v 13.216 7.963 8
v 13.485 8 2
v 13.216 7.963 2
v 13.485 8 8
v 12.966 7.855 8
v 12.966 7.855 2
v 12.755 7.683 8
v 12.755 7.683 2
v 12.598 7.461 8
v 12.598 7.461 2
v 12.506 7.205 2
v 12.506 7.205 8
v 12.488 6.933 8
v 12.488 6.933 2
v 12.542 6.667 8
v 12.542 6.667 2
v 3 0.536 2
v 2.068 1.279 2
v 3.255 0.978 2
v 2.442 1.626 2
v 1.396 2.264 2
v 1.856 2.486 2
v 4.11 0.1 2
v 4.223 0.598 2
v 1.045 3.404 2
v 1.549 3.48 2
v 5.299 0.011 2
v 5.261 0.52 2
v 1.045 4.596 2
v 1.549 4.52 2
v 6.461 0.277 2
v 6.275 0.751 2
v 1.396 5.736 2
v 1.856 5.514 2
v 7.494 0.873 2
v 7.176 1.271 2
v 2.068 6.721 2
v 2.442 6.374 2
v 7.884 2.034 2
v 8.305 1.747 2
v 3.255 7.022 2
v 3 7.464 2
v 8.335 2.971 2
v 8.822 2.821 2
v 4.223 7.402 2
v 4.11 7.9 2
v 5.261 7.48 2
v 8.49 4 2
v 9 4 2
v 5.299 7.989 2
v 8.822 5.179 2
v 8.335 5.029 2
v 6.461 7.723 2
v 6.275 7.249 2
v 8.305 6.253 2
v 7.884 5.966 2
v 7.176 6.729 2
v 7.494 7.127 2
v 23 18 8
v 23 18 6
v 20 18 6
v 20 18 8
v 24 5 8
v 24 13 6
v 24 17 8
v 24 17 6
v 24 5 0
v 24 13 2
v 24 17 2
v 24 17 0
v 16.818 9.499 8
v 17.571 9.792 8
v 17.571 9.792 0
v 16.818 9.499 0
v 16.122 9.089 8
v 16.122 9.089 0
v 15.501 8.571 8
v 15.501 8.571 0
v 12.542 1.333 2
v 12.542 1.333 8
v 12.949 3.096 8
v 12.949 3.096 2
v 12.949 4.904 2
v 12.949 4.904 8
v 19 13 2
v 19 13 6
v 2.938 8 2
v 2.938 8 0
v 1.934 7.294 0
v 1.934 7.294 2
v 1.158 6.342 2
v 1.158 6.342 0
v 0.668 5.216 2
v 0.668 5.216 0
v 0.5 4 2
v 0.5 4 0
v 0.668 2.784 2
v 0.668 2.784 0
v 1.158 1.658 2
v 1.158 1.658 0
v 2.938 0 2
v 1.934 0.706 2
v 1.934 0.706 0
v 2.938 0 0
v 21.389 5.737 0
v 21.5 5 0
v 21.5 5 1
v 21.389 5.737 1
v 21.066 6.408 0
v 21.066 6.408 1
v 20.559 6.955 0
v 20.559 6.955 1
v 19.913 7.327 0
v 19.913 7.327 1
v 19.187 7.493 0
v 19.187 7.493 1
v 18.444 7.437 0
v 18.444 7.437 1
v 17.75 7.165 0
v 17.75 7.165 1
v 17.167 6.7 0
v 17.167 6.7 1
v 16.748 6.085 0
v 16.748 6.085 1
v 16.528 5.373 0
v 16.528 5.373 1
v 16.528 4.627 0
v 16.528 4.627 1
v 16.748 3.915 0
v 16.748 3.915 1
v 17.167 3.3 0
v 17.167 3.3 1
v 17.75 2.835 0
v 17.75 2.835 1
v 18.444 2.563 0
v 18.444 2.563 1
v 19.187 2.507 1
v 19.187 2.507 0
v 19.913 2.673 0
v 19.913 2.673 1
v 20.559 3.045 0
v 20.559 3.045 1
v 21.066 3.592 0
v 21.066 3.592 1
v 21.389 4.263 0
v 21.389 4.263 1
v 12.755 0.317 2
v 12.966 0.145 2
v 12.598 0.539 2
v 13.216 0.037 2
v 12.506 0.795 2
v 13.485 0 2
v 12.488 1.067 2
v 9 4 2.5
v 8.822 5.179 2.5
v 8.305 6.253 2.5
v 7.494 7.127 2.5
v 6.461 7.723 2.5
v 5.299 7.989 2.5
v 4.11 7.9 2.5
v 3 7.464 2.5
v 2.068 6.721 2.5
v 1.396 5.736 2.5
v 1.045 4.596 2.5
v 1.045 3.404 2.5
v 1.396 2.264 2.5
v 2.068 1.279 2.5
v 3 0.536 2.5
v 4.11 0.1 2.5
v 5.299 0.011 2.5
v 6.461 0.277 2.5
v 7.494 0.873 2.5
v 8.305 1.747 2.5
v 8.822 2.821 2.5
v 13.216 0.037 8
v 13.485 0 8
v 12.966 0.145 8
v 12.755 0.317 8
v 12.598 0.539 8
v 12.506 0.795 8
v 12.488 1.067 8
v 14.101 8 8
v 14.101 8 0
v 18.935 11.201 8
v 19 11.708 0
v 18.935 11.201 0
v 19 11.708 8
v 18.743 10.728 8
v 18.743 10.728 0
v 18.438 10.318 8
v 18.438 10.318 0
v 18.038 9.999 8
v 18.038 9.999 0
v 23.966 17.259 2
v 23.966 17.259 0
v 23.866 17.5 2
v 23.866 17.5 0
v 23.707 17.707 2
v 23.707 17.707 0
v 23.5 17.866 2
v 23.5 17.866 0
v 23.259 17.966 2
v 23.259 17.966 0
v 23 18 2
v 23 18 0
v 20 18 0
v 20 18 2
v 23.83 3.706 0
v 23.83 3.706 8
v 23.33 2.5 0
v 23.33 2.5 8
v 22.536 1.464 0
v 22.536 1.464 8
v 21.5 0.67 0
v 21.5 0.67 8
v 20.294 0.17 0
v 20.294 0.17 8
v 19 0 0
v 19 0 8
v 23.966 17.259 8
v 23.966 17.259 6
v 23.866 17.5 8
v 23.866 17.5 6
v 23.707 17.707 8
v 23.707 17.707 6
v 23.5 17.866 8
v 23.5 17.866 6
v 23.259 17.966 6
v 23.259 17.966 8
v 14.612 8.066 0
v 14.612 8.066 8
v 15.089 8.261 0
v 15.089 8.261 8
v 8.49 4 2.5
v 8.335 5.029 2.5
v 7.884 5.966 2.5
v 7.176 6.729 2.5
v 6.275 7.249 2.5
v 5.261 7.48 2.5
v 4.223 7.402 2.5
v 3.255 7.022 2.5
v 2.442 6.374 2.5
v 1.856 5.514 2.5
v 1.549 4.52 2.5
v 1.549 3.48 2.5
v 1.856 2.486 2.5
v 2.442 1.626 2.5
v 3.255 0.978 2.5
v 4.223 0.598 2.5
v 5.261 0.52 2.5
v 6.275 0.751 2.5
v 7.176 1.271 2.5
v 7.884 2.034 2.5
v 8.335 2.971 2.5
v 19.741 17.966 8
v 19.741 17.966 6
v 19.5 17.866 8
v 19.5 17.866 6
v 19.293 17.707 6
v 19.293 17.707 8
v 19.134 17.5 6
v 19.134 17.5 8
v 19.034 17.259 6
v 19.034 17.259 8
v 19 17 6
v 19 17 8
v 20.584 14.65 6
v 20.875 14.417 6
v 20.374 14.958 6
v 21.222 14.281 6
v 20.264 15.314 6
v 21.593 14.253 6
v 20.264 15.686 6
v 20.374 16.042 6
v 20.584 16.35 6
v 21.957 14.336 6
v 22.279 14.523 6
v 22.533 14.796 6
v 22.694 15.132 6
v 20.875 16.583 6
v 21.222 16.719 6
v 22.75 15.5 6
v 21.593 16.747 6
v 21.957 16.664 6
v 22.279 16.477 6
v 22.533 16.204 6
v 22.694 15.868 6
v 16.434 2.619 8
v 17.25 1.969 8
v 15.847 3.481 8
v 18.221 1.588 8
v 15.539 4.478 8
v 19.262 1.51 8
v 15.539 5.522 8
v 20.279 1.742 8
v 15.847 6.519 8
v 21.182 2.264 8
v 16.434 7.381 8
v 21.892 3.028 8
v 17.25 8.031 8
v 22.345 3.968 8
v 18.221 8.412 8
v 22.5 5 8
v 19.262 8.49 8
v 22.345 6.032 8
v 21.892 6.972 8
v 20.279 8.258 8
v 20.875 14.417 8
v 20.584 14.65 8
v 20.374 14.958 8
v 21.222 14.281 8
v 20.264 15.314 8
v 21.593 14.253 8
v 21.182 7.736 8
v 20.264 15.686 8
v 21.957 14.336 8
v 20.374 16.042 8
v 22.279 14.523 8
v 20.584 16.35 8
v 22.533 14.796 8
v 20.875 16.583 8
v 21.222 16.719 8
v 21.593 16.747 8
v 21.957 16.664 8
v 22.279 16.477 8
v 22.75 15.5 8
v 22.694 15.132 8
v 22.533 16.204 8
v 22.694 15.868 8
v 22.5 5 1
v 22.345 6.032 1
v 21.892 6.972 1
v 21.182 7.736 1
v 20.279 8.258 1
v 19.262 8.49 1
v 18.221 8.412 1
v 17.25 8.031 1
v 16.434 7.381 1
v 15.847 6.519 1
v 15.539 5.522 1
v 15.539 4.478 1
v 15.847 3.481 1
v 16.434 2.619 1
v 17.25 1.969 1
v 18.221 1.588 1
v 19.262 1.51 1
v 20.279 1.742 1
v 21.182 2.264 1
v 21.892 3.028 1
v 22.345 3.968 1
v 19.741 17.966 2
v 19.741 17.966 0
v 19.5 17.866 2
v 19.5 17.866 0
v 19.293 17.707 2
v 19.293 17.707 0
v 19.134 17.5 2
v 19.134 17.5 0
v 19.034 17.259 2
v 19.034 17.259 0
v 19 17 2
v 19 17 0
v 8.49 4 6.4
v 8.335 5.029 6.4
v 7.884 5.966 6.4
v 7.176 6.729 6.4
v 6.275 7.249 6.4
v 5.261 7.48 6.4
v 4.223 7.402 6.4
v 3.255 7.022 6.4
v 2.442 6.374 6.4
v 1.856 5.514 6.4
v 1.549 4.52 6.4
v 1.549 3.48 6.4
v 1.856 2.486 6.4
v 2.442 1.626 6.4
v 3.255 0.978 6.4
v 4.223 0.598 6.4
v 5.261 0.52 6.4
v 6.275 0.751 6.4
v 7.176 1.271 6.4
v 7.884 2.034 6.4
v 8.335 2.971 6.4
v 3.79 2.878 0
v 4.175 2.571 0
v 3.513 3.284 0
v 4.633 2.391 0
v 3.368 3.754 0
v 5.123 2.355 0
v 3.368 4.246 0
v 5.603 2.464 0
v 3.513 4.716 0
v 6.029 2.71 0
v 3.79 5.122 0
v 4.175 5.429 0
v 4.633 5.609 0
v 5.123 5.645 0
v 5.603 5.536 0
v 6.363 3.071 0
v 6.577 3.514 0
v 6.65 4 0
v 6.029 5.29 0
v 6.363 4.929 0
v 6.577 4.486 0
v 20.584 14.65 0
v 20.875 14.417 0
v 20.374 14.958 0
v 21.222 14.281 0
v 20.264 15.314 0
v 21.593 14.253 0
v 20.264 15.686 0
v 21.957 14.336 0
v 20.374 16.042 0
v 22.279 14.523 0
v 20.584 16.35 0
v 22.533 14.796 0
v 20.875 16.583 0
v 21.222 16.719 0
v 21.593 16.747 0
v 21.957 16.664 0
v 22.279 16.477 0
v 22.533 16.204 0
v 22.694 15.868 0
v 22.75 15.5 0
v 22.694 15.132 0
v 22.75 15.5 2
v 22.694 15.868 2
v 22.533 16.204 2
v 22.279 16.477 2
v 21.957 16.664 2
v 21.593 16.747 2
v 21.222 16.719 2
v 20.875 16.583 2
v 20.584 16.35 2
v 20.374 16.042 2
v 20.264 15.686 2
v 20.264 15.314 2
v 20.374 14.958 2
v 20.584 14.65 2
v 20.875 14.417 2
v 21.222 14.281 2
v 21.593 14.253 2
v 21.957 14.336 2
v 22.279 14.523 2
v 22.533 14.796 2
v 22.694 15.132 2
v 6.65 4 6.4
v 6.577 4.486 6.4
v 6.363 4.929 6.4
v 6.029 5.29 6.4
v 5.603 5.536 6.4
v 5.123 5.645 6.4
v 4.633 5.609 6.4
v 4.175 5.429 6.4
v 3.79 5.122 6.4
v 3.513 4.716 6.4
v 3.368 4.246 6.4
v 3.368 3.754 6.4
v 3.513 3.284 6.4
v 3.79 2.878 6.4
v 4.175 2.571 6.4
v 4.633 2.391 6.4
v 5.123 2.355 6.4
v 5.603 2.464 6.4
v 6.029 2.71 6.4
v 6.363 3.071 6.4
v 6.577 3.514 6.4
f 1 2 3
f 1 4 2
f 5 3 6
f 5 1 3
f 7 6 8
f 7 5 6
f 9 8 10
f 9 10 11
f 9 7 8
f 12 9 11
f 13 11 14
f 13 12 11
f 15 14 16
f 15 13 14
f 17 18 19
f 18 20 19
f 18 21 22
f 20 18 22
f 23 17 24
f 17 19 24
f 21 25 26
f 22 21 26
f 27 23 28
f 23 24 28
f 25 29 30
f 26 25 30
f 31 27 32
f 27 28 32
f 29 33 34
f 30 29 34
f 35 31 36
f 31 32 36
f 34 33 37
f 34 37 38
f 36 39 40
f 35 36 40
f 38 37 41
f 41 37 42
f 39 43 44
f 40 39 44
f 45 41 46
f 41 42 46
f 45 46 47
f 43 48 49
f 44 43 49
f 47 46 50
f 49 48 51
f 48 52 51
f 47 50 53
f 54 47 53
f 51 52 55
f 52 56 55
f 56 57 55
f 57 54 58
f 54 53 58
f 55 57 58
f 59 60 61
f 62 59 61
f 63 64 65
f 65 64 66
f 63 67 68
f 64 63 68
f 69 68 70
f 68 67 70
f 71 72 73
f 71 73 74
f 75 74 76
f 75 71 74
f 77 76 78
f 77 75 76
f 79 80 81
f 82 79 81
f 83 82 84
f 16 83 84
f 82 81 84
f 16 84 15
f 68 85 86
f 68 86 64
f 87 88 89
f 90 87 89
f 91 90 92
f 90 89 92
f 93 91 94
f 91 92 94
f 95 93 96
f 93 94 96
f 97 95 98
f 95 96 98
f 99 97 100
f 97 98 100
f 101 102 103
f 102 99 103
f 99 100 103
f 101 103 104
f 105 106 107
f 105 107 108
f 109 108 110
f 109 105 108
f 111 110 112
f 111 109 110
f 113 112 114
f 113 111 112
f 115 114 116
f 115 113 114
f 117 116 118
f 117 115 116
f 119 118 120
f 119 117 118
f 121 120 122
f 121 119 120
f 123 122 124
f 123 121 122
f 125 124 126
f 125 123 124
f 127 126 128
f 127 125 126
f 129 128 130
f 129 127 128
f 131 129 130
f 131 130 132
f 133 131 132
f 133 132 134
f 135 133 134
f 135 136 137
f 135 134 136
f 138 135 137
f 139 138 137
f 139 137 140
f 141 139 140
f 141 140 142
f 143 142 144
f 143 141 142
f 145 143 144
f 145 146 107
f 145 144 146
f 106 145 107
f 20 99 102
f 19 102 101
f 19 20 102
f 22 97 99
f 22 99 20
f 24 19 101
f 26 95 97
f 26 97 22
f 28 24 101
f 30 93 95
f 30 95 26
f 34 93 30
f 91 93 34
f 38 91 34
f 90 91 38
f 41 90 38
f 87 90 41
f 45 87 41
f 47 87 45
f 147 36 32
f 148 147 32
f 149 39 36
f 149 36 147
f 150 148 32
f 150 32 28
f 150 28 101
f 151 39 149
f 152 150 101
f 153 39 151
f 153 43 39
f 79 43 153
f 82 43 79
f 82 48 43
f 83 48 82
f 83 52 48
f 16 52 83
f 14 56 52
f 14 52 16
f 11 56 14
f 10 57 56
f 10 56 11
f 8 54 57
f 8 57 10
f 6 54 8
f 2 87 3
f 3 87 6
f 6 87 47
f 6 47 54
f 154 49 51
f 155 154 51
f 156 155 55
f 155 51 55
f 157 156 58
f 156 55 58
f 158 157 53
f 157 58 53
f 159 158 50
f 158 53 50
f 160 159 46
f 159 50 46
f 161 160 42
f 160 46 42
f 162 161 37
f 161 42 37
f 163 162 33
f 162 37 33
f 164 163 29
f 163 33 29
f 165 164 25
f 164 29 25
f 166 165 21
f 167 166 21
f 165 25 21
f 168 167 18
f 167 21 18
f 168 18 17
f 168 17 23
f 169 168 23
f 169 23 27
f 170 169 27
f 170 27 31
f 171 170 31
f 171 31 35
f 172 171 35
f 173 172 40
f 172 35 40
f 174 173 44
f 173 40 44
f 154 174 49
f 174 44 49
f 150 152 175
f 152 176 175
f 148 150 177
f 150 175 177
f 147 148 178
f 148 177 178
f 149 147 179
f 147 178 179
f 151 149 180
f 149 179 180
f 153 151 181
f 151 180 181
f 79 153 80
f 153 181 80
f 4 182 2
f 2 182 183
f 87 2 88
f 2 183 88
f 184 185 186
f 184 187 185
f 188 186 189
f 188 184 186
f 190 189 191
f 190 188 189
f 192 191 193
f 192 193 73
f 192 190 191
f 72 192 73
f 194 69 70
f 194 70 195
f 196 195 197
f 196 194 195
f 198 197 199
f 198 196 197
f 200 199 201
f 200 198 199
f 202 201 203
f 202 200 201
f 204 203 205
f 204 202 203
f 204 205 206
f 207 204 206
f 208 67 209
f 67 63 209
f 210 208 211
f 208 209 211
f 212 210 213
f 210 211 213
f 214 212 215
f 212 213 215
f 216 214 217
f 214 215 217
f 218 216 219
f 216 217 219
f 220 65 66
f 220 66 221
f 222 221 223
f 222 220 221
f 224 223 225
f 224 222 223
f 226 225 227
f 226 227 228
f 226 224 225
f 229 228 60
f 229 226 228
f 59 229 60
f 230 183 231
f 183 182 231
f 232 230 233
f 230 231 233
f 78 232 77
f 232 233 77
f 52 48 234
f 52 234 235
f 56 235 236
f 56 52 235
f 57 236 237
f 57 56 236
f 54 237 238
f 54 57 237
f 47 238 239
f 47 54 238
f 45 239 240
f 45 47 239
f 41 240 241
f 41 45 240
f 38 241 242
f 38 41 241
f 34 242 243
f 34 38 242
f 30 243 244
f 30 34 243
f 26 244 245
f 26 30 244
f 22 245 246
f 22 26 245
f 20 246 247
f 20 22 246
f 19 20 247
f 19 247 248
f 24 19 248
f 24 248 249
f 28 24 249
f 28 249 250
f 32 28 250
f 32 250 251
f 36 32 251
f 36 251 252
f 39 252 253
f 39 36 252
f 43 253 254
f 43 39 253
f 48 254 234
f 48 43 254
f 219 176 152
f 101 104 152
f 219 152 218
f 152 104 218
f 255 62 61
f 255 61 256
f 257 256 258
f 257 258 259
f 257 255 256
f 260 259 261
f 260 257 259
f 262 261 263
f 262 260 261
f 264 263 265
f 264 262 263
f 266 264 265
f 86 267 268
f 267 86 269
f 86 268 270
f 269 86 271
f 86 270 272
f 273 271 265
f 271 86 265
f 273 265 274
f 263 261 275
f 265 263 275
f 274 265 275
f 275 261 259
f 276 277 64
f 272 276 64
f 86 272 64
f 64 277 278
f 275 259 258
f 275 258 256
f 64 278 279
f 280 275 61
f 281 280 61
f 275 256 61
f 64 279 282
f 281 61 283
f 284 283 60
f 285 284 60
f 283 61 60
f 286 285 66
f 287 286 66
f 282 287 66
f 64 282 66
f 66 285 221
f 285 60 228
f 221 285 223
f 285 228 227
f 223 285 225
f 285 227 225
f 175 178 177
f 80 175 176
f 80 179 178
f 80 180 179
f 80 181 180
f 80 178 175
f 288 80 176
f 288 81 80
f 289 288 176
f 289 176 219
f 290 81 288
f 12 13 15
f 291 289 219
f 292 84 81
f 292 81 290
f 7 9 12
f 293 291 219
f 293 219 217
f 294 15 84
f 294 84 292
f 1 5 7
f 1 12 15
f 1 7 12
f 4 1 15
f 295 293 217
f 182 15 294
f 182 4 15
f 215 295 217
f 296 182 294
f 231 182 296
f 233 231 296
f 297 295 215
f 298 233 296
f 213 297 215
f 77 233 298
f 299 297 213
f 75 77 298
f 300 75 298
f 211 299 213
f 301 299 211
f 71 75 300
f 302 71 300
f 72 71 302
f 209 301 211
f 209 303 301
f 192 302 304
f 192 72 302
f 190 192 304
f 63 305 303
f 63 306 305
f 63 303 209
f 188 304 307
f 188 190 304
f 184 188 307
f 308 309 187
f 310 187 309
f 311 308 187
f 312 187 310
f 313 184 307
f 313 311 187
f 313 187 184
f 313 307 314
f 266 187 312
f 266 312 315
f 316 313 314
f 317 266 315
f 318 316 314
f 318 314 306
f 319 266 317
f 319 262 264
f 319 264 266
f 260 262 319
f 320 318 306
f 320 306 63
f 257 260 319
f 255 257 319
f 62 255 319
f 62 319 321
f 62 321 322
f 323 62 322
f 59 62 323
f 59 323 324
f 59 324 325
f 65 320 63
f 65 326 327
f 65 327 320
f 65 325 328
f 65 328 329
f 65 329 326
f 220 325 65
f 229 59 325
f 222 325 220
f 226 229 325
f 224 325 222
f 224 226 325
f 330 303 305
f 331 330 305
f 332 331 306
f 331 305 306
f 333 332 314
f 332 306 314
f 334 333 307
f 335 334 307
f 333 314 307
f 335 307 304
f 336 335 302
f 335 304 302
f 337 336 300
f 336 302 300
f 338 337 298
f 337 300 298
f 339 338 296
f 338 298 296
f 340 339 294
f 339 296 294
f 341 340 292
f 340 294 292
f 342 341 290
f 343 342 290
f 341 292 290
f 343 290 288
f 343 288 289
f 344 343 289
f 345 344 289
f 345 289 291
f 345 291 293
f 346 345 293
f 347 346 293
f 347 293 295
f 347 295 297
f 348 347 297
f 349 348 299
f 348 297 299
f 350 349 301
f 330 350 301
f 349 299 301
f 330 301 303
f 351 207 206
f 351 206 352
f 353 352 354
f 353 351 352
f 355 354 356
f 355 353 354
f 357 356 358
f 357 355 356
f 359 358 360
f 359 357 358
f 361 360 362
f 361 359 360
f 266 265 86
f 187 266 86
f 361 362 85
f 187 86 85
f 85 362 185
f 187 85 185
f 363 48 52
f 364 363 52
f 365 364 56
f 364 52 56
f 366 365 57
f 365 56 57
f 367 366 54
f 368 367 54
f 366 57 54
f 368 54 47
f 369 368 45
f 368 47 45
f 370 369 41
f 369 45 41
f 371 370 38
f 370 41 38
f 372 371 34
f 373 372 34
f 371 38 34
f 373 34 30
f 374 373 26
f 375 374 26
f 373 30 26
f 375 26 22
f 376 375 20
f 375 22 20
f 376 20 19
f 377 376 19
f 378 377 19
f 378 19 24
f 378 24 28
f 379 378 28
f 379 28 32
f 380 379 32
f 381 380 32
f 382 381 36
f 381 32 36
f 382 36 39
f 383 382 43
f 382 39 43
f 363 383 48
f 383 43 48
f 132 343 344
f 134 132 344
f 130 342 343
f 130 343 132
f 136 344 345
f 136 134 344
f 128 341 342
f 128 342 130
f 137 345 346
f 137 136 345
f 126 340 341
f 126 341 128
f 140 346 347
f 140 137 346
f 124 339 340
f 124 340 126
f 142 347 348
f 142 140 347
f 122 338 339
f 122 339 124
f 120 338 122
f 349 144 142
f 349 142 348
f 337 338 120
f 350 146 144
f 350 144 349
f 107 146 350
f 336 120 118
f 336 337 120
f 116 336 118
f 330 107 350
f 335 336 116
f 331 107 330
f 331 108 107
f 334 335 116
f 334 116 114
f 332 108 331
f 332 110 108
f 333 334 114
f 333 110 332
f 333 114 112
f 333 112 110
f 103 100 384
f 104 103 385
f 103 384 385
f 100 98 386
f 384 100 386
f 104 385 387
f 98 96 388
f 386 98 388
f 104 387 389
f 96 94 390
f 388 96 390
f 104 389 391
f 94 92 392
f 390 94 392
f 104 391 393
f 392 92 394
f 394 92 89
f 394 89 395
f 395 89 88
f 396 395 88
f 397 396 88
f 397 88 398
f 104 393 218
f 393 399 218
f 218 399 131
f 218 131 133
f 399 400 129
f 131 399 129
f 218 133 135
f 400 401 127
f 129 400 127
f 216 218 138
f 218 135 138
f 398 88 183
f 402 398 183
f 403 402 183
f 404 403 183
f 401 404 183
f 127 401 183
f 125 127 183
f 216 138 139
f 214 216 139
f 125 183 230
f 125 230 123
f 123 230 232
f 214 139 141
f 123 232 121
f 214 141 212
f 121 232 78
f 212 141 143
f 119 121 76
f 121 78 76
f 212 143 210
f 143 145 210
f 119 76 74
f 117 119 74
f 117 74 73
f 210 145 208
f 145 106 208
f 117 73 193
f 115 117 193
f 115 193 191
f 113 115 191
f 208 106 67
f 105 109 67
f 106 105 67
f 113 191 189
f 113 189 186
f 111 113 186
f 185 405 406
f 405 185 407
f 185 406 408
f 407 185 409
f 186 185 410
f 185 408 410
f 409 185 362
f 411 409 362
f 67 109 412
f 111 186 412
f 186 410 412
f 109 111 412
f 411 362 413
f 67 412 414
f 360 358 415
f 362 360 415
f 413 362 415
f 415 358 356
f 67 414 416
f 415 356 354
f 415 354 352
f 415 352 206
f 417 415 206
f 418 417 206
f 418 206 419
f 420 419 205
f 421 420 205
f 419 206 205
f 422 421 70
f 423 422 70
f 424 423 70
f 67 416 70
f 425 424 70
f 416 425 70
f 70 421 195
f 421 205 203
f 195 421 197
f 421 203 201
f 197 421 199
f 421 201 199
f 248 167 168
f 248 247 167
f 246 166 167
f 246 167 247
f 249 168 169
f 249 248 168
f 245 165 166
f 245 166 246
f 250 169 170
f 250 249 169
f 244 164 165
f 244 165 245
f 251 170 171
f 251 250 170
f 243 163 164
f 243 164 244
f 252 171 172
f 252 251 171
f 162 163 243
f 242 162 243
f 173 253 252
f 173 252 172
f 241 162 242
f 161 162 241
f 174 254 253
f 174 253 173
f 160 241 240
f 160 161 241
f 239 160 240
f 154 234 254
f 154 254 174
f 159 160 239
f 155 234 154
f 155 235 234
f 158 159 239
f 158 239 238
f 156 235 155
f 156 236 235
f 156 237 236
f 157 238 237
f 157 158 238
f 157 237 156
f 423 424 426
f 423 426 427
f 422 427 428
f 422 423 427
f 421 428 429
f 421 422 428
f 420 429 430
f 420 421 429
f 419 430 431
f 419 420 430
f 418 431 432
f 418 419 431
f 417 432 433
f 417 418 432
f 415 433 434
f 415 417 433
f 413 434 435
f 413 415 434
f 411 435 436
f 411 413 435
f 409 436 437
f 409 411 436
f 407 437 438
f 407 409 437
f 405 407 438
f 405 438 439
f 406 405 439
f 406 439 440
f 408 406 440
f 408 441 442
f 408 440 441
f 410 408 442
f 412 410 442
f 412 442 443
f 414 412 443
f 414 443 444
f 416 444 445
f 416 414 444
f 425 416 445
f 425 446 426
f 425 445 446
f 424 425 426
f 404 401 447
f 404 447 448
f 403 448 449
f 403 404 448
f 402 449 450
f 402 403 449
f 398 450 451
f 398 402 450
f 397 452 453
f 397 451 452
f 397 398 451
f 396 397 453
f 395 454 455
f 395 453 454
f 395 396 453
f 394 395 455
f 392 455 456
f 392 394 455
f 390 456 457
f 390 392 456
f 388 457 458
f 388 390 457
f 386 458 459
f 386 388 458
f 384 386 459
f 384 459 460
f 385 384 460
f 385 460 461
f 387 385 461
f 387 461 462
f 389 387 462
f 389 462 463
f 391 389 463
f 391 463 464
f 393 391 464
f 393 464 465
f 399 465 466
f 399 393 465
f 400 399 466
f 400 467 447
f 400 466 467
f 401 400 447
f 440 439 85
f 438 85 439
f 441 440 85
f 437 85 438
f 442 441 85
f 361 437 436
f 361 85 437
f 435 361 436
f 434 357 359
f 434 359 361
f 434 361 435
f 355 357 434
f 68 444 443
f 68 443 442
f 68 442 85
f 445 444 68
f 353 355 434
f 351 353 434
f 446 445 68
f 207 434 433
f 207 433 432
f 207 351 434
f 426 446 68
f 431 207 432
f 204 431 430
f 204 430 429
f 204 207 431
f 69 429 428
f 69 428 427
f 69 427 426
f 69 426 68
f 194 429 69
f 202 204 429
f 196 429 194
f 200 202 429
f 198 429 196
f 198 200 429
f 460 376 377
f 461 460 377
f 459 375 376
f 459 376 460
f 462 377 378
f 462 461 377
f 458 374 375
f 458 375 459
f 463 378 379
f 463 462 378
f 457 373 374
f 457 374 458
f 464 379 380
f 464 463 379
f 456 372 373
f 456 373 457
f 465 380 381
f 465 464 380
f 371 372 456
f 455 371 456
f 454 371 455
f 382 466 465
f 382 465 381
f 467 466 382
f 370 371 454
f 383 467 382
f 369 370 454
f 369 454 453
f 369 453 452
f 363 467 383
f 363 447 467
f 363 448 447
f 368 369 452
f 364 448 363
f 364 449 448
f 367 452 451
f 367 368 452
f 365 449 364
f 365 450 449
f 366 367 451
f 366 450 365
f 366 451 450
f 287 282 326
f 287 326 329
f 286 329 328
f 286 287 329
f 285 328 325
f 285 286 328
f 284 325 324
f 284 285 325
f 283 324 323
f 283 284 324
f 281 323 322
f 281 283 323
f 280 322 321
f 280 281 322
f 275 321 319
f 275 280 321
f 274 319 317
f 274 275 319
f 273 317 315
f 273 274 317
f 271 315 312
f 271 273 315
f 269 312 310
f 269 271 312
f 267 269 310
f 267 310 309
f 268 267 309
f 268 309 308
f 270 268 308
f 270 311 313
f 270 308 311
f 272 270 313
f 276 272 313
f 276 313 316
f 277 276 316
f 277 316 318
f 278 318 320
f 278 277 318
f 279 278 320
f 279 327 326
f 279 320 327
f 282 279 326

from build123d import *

# Parameters (mm, degrees)
BOSS_EXTRU_1_DEPTH           = 8
ESQUISSE2_R                  = 5
BOSS_EXTRU_2_DEPTH           = 8
ESQUISSE3_R                  = 3.5
ENL_V_MAT_EXTRU_1_DEPTH      = 7
ENL_V_MAT_EXTRU_2_DEPTH      = 31.805843601
ENL_V_MAT_EXTRU_2_DEPTH_BACK = 31.805843601
ESQUISSE4_R                  = 2.5
ESQUISSE5_R                  = 8
ENL_V_MAT_EXTRU_3_DEPTH      = 6
ESQUISSE6_R                  = 3.49
BOSS_EXTRU_3_DEPTH           = 4.4
ENL_V_MAT_EXTRU_4_DEPTH      = 31.675071312
ENL_V_MAT_EXTRU_4_DEPTH_BACK = 31.675071312
ESQUISSE7_R                  = 1.65
ENL_V_MAT_EXTRU_5_DEPTH      = 31.594117082
ENL_V_MAT_EXTRU_5_DEPTH_BACK = 31.594117082
CONG_1_R                     = 5
CONG_2_R                     = 1
ESQUISSE9_W                  = 5
ESQUISSE9_H                  = 4
ENL_V_MAT_EXTRU_6_DEPTH      = 5
CONG_3_R                     = 2
ENL_V_MAT_EXTRU_7_DEPTH      = 32.048349393
ENL_V_MAT_EXTRU_7_DEPTH_BACK = 32.048349393
ESQUISSE10_R                 = 1.25
BOSS_EXTRU_4_START           = -4.4
ESQUISSE11_R                 = 4
ESQUISSE11_R_2               = 3.49
BOSS_EXTRU_4_DEPTH           = 0.5


with BuildPart() as part:
    # Esquisse1 → Boss.-Extru.1 (new body)
    with BuildSketch(Plane.XY):
        Polygon((0, 0), (24, 0), (24, 18), (19, 18), (19, 8), (0, 8), align=None)
    extrude(amount=BOSS_EXTRU_1_DEPTH)

    # Esquisse2 → Boss.-Extru.2 (add)
    with BuildSketch(Plane.XY.offset(8)):
        with Locations((19, 5)):
            Circle(ESQUISSE2_R)
    extrude(amount=-BOSS_EXTRU_2_DEPTH)

    # Esquisse3 → Enlèv. mat.-Extru.1 (cut)
    with BuildSketch(Plane.XY.offset(8)):
        with Locations((19, 5)):
            Circle(ESQUISSE3_R)
    extrude(amount=-ENL_V_MAT_EXTRU_1_DEPTH, mode=Mode.SUBTRACT)

    # Esquisse4 → Enlèv. mat.-Extru.2 (cut, two sides: drawn at the far end of the back side and taken through both)
    with BuildSketch(Plane.XY.offset(1).offset(-ENL_V_MAT_EXTRU_2_DEPTH_BACK)):
        with Locations((19, 5)):
            Circle(ESQUISSE4_R)
    extrude(amount=ENL_V_MAT_EXTRU_2_DEPTH + ENL_V_MAT_EXTRU_2_DEPTH_BACK, mode=Mode.SUBTRACT)

    # Esquisse5 → Enlèv. mat.-Extru.3 (cut)
    with BuildSketch(Plane.XY.offset(8)):
        with Locations((5, 4)):
            Circle(ESQUISSE5_R)
    extrude(amount=-ENL_V_MAT_EXTRU_3_DEPTH, mode=Mode.SUBTRACT)

    # Esquisse6 → Boss.-Extru.3 (add)
    with BuildSketch(Plane.XY.offset(2)):
        with Locations((5, 4)):
            Circle(ESQUISSE6_R)
    extrude(amount=BOSS_EXTRU_3_DEPTH)

    # Esquisse7 → Enlèv. mat.-Extru.4 (cut, two sides: drawn at the far end of the back side and taken through both)
    with BuildSketch(Plane.XY.offset(6.4).offset(-ENL_V_MAT_EXTRU_4_DEPTH_BACK)):
        with Locations((5, 4)):
            Circle(ESQUISSE7_R)
    extrude(amount=ENL_V_MAT_EXTRU_4_DEPTH + ENL_V_MAT_EXTRU_4_DEPTH_BACK, mode=Mode.SUBTRACT)

    # Esquisse8 → Enlèv. mat.-Extru.5 (cut, two sides: drawn at the far end of the back side and taken through both)
    with BuildSketch(Plane.XY.offset(2).offset(-ENL_V_MAT_EXTRU_5_DEPTH_BACK)):
        with BuildLine():
            Line((0, 8), (2.938447187, 8))
            ThreePointArc((2.938447187, 8), (0.5, 4), (2.938447187, 0))
            Line((2.938447187, 0), (0, 0))
            Line((0, 0), (0, 8))
        make_face()
    extrude(amount=ENL_V_MAT_EXTRU_5_DEPTH + ENL_V_MAT_EXTRU_5_DEPTH_BACK, mode=Mode.SUBTRACT)

    # Congé1
    cong_1_edges = [part.edges().sort_by_distance(p)[0] for p in [
        (24, 0, 4),
    ]]
    fillet(cong_1_edges, radius=CONG_1_R)

    # Congé2
    cong_2_edges = [part.edges().sort_by_distance(p)[0] for p in [
        (19, 18, 4),
        (24, 18, 4),
        (11.92820323, 0, 5),
        (11.92820323, 8, 5),
    ]]
    fillet(cong_2_edges, radius=CONG_2_R)

    # Esquisse9 → Enlèv. mat.-Extru.6 (cut)
    with BuildSketch(Plane(origin=(0, 18, 0), x_dir=(1, 0, 0), z_dir=(0, 1, 0))):
        with Locations((21.5, -4)):
            Rectangle(ESQUISSE9_W, ESQUISSE9_H)
    extrude(amount=-ENL_V_MAT_EXTRU_6_DEPTH, mode=Mode.SUBTRACT)

    # Congé3
    cong_3_edges = [part.edges().sort_by_distance(p)[0] for p in [
        (19, 10, 4),
        (15, 8, 4),
    ]]
    fillet(cong_3_edges, radius=CONG_3_R)

    # Esquisse10 → Enlèv. mat.-Extru.7 (cut, two sides: drawn at the far end of the back side and taken through both)
    with BuildSketch(Plane.XY.offset(8).offset(-ENL_V_MAT_EXTRU_7_DEPTH_BACK)):
        with Locations((21.5, 15.5)):
            Circle(ESQUISSE10_R)
    extrude(amount=ENL_V_MAT_EXTRU_7_DEPTH + ENL_V_MAT_EXTRU_7_DEPTH_BACK, mode=Mode.SUBTRACT)


with BuildPart() as body_2:
    # Esquisse11 → Boss.-Extru.4 (new body)
    with BuildSketch(Plane.XY.offset(6.4).offset(BOSS_EXTRU_4_START)):
        with Locations((5, 4)):
            Circle(ESQUISSE11_R)
        with Locations((5, 4)):
            Circle(ESQUISSE11_R_2, mode=Mode.SUBTRACT)
    extrude(amount=BOSS_EXTRU_4_DEPTH)


solid = Compound([part.part, body_2.part])
